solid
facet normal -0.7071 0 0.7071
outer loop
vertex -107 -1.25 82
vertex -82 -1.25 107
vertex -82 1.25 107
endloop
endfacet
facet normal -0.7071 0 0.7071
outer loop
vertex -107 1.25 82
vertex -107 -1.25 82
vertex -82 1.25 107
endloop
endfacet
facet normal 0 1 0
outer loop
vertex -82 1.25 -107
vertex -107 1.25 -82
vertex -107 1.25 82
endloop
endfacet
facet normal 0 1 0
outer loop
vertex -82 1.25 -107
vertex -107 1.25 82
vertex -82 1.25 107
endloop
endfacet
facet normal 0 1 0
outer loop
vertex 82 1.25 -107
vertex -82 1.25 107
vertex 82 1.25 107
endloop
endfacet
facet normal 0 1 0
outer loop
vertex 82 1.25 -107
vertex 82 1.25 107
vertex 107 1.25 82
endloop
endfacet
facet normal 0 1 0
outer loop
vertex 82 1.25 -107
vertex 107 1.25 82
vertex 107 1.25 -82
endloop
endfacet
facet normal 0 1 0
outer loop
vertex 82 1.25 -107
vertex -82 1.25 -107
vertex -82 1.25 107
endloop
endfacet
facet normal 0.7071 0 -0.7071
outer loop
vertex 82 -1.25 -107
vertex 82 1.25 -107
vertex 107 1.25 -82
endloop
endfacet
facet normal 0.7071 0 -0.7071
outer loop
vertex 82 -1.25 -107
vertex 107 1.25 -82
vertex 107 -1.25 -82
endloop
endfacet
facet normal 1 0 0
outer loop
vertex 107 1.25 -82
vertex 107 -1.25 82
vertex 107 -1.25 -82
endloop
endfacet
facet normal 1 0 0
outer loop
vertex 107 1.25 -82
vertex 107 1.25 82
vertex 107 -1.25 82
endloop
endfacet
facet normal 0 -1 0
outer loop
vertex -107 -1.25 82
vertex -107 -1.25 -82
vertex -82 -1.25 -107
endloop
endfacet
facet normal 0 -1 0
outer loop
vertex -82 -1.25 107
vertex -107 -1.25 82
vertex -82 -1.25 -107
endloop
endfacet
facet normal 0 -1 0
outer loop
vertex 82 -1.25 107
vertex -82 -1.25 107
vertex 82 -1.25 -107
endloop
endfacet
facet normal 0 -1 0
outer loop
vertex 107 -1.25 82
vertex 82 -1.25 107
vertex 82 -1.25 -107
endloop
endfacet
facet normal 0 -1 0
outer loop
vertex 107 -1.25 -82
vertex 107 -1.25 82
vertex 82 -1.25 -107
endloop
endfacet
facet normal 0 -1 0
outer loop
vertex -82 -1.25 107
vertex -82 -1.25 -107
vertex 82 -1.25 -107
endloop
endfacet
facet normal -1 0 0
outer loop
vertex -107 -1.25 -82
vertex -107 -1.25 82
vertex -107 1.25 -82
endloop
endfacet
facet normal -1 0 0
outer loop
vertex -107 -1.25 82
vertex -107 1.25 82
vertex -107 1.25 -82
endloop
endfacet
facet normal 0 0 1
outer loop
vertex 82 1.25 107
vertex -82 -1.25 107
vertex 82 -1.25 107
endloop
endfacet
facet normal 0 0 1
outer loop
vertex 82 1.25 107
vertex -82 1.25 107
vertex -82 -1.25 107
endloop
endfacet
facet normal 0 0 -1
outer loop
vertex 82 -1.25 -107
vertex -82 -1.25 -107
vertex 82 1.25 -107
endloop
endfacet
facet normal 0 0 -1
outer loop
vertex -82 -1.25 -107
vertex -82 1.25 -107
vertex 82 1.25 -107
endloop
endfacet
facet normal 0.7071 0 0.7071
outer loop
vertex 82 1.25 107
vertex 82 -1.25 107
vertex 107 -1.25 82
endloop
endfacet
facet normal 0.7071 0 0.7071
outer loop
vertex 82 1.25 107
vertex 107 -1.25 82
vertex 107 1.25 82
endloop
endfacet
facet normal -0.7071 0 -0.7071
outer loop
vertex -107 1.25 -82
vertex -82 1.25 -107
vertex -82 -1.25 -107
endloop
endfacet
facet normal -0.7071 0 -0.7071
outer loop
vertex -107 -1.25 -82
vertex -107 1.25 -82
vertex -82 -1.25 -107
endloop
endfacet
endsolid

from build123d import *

# Parameters (mm, degrees)
ESBO_O1_W                = 214
ESBO_O1_H                = 214
ESBO_O1_R                = 2.5
RESSALTO_EXTRUS_O1_DEPTH = 1.25
CHANFRO1_SIZE            = 25


with BuildPart() as part:
    # Esboço1 → Ressalto-extrusão1 (new, symmetric)
    with BuildSketch(Plane(origin=(0, 0, 0), x_dir=(1, 0, 0), z_dir=(0, 1, 0))):
        Rectangle(ESBO_O1_W, ESBO_O1_H)
        with Locations(Location((100, 100, 0), (0, 0, 270))):
            Circle(ESBO_O1_R, mode=Mode.SUBTRACT)
        with Locations(Location((-100, 100, 0), (0, 0, 90))):
            Circle(ESBO_O1_R, mode=Mode.SUBTRACT)
        with Locations(Location((100, -100, 0), (0, 0, 90))):
            Circle(ESBO_O1_R, mode=Mode.SUBTRACT)
        with Locations(Location((-100, -100, 0), (0, 0, 270))):
            Circle(ESBO_O1_R, mode=Mode.SUBTRACT)
    extrude(amount=RESSALTO_EXTRUS_O1_DEPTH, both=True)

    # Chanfro1
    chanfro1_edges = [part.edges().sort_by_distance(p)[0] for p in [
        (-107, 0, 107),
        (107, 0, 107),
        (107, 0, -107),
        (-107, 0, -107),
    ]]
    chamfer(chanfro1_edges, length=CHANFRO1_SIZE)


solid = part.part
